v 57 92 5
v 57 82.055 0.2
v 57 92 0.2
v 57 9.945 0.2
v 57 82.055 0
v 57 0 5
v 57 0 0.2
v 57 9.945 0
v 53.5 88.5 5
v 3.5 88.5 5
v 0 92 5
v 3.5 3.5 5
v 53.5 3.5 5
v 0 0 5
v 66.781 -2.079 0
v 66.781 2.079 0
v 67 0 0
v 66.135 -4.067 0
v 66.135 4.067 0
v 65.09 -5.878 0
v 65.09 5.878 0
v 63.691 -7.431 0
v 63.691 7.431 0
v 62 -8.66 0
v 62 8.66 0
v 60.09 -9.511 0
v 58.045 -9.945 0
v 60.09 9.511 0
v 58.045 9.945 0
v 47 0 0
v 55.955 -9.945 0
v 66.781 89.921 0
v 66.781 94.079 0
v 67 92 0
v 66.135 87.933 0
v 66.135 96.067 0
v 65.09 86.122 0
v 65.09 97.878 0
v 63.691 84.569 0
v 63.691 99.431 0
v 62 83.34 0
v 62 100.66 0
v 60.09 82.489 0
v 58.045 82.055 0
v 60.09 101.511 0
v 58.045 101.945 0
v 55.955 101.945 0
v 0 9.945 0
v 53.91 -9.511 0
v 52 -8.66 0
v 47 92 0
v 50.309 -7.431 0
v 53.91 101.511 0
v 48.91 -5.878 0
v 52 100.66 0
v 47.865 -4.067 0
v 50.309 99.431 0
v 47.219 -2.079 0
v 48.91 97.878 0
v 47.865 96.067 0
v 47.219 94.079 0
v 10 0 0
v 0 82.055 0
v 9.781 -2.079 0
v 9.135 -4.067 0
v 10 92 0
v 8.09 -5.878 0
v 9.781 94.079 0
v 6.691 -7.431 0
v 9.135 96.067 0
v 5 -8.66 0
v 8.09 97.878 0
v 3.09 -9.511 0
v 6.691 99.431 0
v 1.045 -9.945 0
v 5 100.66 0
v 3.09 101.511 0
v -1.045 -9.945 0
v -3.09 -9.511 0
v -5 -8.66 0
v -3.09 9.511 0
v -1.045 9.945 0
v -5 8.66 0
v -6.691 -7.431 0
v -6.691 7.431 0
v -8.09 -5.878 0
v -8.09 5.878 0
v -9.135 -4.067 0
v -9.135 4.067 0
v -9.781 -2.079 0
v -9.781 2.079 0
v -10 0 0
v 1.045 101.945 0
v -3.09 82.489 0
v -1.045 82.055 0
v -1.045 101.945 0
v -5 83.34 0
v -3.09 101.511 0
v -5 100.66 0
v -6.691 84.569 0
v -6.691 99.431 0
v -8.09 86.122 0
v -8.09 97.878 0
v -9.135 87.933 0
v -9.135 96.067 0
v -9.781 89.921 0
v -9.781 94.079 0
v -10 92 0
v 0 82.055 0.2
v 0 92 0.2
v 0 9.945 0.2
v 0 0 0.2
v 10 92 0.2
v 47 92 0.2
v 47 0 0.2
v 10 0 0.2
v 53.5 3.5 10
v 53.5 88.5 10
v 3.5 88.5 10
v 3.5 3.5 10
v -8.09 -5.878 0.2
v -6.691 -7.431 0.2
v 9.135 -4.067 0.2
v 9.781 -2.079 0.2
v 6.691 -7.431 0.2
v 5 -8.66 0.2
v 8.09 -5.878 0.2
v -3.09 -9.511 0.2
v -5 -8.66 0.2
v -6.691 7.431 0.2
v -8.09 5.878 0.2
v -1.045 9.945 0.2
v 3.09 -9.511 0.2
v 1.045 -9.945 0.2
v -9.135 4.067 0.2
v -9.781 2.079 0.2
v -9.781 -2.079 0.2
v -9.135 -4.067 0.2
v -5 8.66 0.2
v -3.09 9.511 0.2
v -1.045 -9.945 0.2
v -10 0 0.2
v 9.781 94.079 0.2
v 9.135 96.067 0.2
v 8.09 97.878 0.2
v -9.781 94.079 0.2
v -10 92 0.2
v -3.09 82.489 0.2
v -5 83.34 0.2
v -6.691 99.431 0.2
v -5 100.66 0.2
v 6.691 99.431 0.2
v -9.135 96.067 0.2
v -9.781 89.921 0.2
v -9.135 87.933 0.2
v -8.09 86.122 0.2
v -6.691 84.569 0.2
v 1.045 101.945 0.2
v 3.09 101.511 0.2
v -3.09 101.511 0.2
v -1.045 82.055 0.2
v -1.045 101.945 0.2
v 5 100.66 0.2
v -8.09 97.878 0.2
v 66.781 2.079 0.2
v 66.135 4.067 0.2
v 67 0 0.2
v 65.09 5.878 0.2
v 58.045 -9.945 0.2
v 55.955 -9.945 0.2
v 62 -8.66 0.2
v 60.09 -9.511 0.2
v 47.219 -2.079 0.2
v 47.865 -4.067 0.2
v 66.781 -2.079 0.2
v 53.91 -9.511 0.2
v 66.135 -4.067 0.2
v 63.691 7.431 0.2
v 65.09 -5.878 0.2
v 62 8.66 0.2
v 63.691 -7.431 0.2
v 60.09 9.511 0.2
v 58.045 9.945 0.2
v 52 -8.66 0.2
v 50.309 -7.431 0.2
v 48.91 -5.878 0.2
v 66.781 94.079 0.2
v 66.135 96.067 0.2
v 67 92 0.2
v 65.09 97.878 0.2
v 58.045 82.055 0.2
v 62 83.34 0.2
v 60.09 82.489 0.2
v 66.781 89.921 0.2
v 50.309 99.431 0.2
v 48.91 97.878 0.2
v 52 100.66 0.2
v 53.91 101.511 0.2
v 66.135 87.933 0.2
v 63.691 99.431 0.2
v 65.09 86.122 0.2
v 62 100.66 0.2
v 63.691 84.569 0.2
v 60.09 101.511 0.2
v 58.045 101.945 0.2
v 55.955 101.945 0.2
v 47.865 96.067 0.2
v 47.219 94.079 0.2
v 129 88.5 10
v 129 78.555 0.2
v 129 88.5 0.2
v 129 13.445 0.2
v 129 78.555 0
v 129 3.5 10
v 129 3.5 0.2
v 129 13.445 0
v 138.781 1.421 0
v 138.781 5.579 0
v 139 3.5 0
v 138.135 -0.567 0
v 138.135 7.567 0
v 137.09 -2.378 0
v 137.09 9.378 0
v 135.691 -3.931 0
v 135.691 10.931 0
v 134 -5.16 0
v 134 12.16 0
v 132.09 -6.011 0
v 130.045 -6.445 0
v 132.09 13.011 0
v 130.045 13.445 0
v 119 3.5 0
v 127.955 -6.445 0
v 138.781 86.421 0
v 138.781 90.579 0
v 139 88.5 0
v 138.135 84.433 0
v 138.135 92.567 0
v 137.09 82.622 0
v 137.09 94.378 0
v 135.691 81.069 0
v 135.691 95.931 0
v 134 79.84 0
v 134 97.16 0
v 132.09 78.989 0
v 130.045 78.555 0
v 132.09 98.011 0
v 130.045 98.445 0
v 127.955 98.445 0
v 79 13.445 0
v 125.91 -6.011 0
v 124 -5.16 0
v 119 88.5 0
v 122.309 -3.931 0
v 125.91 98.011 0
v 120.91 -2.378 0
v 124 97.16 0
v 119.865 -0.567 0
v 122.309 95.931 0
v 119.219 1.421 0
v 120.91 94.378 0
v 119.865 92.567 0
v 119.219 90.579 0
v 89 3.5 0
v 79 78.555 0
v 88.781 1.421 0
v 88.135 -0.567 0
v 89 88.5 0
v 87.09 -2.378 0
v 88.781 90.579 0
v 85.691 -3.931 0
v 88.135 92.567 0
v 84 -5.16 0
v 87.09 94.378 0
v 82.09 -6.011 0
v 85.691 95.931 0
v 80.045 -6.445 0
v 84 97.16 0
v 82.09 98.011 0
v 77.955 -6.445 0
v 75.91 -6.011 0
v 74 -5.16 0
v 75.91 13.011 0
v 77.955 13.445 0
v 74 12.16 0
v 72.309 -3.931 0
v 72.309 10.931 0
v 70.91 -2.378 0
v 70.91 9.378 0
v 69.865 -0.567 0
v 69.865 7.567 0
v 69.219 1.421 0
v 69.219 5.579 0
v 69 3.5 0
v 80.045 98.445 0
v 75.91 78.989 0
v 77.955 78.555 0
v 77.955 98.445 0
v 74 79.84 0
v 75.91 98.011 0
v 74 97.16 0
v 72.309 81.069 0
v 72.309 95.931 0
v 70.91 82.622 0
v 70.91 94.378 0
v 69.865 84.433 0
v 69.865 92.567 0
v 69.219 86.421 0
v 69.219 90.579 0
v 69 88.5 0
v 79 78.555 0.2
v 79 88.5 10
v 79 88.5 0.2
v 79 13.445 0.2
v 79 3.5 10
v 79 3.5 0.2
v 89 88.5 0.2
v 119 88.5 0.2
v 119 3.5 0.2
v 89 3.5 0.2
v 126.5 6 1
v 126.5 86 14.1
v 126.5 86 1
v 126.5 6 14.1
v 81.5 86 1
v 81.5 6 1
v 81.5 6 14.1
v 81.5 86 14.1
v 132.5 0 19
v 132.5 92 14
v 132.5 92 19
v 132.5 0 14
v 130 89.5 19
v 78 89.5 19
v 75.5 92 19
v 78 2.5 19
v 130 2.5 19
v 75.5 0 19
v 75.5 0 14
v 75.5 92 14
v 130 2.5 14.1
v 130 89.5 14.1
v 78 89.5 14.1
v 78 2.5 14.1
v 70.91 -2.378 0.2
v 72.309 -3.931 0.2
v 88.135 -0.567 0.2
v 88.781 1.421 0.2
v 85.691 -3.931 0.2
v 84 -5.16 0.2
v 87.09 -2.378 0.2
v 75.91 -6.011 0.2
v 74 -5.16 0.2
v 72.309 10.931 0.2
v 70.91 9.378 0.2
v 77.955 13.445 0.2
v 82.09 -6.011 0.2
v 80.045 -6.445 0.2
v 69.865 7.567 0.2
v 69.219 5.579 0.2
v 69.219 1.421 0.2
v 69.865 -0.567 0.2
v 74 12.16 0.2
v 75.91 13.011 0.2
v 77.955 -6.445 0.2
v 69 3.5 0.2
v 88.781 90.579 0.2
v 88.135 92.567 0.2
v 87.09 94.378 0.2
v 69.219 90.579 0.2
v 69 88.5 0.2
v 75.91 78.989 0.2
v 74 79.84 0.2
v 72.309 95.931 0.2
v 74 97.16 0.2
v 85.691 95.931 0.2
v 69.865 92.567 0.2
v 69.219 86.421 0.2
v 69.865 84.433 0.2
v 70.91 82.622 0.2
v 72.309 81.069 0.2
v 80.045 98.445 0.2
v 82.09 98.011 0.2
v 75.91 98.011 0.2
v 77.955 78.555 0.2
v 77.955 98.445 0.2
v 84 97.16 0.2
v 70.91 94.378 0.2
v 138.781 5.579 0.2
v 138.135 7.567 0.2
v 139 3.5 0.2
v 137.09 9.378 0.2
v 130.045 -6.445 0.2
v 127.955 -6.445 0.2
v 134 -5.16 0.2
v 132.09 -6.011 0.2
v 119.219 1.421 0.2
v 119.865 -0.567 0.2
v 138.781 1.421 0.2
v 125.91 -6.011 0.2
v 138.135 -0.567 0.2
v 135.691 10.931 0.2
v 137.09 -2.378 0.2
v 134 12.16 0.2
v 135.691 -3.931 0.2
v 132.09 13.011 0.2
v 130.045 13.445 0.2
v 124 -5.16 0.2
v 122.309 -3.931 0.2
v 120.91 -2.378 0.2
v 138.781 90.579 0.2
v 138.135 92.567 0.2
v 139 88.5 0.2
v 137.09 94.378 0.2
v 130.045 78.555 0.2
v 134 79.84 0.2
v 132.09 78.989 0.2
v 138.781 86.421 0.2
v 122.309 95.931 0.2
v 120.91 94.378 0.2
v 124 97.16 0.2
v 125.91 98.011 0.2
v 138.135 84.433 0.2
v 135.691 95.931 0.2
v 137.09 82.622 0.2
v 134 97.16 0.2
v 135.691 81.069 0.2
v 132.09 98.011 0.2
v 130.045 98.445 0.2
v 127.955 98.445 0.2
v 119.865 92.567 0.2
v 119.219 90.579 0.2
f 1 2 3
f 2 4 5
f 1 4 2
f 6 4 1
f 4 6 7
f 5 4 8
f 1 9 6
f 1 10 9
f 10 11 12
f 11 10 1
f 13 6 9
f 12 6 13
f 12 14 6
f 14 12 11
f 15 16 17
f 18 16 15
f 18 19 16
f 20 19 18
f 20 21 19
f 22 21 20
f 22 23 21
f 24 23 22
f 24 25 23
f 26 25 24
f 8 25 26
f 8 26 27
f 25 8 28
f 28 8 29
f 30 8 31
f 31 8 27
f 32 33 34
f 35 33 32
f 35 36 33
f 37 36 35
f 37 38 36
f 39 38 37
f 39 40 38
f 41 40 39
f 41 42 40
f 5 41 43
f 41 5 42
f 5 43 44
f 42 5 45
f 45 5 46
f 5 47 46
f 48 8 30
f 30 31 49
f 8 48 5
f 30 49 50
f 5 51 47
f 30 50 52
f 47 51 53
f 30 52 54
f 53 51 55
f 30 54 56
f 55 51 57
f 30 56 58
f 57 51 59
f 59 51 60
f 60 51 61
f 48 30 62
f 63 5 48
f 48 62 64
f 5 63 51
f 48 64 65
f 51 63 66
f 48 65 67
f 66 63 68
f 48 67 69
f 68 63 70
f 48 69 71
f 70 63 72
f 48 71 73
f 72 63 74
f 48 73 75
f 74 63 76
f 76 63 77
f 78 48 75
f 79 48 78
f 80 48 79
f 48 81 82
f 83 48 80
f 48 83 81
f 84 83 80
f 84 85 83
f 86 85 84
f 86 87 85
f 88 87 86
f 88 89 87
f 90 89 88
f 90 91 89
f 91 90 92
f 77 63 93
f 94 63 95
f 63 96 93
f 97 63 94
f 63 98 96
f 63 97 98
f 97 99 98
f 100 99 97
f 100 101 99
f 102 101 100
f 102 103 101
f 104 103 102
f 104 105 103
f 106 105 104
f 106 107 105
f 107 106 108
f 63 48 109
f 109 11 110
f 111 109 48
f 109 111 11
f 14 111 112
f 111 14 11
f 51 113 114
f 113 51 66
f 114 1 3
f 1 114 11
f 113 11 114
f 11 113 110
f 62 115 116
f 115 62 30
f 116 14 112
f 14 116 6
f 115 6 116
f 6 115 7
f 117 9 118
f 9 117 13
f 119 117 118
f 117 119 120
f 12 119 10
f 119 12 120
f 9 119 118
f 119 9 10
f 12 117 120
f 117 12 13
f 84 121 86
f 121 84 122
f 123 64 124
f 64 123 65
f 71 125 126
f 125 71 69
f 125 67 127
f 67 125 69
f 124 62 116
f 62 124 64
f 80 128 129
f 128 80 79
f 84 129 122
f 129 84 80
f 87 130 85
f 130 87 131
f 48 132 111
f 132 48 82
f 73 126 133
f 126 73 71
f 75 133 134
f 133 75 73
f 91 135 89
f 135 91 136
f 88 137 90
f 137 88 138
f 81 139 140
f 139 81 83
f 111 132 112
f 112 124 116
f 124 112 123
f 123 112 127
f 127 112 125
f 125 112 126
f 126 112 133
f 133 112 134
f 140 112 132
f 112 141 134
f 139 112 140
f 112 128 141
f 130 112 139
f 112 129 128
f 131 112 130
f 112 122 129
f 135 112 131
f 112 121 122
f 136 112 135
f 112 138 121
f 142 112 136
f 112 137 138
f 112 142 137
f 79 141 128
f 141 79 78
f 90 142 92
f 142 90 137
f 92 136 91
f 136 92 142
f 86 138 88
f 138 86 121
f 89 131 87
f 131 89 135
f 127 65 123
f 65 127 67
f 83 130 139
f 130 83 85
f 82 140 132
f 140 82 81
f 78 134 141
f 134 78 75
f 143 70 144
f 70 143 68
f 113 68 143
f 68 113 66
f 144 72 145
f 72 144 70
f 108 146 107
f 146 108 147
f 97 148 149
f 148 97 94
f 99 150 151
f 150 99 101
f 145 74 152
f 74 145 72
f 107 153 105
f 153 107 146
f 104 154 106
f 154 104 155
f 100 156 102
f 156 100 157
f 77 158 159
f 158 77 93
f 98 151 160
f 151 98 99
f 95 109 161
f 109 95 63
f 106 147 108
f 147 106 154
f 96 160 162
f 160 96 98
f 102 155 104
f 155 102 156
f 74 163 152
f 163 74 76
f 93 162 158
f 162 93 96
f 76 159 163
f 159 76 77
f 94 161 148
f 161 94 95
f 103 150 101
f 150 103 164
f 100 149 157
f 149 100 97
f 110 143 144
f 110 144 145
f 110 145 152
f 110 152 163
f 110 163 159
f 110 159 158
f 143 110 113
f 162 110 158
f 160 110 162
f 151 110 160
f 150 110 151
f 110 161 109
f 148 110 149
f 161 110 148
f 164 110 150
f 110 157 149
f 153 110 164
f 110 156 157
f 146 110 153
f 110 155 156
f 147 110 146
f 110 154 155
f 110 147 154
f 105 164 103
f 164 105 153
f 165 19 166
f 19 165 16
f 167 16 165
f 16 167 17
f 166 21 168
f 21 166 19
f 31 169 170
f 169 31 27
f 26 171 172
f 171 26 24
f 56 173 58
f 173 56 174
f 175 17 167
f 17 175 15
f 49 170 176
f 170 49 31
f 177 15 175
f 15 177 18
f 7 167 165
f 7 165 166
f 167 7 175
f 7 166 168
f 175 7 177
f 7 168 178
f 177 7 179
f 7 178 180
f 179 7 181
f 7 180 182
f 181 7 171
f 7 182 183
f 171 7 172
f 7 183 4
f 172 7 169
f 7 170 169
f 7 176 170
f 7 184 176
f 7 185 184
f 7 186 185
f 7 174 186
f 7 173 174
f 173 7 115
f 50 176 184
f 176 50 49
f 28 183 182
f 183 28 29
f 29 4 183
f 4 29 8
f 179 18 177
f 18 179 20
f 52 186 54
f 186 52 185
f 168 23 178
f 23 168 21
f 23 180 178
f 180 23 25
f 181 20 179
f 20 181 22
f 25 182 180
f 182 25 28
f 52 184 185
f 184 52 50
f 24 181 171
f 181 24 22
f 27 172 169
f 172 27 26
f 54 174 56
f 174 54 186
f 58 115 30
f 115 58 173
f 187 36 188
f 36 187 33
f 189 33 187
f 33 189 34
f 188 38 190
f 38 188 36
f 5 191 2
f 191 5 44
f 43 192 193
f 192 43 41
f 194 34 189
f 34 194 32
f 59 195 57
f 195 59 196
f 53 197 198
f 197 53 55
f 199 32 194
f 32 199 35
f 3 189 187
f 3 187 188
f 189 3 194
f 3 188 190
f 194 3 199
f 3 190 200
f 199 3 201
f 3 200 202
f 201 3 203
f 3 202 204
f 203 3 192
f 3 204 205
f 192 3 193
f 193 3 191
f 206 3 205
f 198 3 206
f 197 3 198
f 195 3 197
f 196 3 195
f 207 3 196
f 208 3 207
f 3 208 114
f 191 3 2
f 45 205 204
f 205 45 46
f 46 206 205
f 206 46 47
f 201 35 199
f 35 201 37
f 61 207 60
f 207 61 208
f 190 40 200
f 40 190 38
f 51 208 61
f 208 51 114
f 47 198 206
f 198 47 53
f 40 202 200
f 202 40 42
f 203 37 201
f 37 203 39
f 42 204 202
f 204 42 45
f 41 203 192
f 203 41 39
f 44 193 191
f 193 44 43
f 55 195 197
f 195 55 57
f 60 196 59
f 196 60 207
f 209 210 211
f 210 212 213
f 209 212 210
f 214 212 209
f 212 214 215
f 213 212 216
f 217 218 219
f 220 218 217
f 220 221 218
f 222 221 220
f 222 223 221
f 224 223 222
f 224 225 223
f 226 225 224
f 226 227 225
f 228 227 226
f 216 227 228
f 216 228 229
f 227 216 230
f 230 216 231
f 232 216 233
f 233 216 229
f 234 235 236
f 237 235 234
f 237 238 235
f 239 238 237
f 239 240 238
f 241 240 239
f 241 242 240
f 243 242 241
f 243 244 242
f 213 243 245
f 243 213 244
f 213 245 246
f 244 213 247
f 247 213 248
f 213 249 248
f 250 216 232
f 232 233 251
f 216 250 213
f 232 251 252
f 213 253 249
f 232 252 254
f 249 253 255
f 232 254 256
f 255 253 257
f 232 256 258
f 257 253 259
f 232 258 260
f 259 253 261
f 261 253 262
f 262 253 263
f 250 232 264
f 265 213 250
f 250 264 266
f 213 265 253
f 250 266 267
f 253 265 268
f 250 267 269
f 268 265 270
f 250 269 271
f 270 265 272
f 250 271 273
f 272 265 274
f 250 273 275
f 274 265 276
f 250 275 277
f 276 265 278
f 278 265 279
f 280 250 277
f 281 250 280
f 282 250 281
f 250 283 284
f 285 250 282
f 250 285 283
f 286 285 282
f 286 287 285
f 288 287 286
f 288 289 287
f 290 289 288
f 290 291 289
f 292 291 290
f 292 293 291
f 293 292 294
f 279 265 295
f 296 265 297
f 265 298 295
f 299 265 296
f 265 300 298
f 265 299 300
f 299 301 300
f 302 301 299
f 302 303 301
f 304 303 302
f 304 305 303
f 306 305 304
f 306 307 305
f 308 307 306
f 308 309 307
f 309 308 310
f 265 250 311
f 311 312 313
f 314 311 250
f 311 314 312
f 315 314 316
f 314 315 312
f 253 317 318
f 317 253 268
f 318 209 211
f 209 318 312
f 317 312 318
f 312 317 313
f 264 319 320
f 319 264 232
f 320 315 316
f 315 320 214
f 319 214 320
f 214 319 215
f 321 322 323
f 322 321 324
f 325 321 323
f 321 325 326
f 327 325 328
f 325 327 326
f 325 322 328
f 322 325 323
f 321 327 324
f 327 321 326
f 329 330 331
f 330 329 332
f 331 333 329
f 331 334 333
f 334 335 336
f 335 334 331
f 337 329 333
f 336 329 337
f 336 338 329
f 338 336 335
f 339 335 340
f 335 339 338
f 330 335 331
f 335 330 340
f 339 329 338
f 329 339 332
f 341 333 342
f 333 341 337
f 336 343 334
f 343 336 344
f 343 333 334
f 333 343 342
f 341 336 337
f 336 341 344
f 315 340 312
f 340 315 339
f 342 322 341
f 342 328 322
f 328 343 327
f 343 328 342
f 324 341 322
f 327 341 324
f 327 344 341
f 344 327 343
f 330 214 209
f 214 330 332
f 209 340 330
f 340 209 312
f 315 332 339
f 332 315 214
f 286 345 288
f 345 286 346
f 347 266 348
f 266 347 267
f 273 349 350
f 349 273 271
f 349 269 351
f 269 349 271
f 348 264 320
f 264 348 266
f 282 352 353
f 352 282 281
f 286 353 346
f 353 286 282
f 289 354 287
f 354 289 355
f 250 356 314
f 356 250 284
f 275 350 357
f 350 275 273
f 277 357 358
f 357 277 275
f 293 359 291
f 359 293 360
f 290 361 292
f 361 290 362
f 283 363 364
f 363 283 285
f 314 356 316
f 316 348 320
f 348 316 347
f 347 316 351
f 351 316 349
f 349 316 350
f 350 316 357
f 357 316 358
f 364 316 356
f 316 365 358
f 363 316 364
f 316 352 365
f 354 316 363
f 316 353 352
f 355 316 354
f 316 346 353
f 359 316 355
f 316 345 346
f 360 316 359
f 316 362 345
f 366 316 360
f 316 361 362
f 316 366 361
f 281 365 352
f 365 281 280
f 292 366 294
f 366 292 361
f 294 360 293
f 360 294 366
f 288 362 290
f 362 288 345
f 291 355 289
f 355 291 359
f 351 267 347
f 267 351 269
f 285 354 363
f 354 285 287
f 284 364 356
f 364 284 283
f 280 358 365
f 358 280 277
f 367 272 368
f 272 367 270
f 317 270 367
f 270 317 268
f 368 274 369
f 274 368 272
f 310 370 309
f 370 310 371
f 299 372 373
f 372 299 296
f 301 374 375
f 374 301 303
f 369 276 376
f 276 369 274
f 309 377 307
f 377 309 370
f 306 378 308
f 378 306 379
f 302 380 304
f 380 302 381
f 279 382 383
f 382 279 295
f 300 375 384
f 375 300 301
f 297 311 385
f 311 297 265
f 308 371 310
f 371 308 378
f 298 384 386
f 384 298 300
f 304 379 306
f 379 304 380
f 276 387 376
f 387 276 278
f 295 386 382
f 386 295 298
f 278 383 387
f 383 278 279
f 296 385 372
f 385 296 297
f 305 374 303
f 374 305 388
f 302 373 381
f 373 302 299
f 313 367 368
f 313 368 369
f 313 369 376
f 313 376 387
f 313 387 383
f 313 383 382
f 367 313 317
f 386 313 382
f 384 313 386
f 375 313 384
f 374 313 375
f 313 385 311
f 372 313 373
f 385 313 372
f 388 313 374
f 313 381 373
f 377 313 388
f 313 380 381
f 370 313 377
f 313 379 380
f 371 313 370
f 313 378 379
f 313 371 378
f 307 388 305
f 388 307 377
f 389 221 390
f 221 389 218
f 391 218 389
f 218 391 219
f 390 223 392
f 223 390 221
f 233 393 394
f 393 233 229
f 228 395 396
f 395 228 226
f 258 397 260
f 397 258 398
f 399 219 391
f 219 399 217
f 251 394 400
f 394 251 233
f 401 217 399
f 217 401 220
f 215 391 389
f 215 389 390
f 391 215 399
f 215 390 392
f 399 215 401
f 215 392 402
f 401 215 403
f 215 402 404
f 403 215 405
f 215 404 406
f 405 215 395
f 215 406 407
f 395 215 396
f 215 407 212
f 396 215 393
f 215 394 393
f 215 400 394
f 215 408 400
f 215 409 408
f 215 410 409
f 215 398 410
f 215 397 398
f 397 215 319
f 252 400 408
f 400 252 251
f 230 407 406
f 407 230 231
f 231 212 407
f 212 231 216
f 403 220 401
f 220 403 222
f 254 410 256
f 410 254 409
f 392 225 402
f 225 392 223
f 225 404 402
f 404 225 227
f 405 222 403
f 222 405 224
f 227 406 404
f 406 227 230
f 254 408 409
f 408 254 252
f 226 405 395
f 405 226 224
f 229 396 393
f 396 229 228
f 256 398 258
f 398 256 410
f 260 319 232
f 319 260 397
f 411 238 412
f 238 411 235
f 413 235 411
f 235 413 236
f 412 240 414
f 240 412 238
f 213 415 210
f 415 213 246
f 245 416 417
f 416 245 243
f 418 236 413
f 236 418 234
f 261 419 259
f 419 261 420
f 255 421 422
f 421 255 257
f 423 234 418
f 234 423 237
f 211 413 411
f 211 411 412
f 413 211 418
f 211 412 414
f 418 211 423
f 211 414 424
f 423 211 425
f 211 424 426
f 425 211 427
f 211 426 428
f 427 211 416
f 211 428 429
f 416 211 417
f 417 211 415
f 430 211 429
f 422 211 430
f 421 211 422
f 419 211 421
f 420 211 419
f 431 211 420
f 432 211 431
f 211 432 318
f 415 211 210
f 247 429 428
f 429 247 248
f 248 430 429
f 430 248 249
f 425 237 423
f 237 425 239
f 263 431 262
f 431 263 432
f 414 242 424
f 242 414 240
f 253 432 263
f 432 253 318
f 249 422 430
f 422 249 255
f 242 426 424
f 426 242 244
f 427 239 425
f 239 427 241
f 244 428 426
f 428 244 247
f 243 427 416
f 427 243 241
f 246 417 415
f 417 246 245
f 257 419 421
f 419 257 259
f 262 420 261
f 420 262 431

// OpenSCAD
// Display the Cover
display_cover = "yes"; // [yes,no]
// Display the box
display_box = "yes"; // [yes,no]
// Create ears at the corner
with_antiwarp_ears = "yes"; // [yes,no]


// the x length inside the box (the resulting x of the box is inner_x + 2*wall)
inner_x = 45;
// the y length inside the box
inner_y = 80;
// the z height inside the box, until the stacking frame begins
inner_z = 13;

// the z height of the stacking frame
stack_z = 5;
// per side gap between the box-bottom and the stacking frame (box bttom = inner_x + 2*wall; inner stackingframe x = inner_x + 2*wall + 2*stack_gap)
stack_gap = 1;

// wall thickness
wall = 2.5;
// bottom thickness
bottom = 1;

// start-height for overhang suport (should be >stack_z )
support_start_height = 10;

// height of the cover (the stacking part has the "stack_z"-height)
cover_height = 5;

// radius of the antiwarp ear
ear_radius = 10;
// height of the antiwarp ear, should be your layer-height for easy cutoff
ear_height = 0.2;


if(display_cover == "yes"){
	stackable_box_cover(inner_x,inner_y,stack_z,stack_gap,wall,cover_height);
	if(with_antiwarp_ears == "yes"){
		ears(0, 0, inner_x + wall*4 + stack_gap*2, inner_y + wall*4 + stack_gap*2);
	}
}


if(display_box == "yes"){
translate([inner_x + wall*4 + stack_gap*2 + ear_radius*2 + 2,wall + stack_gap,0]){
	stackable_box(inner_x,inner_y,inner_z,stack_z,stack_gap,wall,bottom,support_start_height);
	if(with_antiwarp_ears == "yes"){
		difference() {
			ears(0, 0, inner_x + wall*2, inner_y + wall*2);
			translate([wall,wall, 0]) 
				cube([inner_x, inner_y, inner_z*2]);
		}
	}
}
}


module stackable_box_cover(x, y,stack_z, gap, w,c) {
	cube([x + w*4 + gap*2, y + w*4 + gap*2, c]);
	translate([w+gap, w+gap, 0])
		cube([x + w*2, y + w*2, stack_z+c]);


}


module stackable_box(x, y, z,stack_z, gap, w, b, supheight) {
	box(x, y, z, w, b);
	translate([-wall-gap, -wall-gap, z+b])
		box(x + wall*2 + gap*2, y + wall*2 + gap*2, stack_z, w, 0);

	difference() {
		hull() {
			translate([-wall-gap, -wall-gap, z+b]) 
				box(x + wall*2 + gap*2, y + wall*2 + gap*2, 0.1, w, 0);
			translate([0, 0, supheight]) 
				box(x, y, 0.1, w, b);
		}
		translate([w,w, 0]) 
			cube([x, y, z*2]);
	}


}

module box(x, y, z, w,b) {
	difference() {
		cube([(x + (2 * w)), (y + (2 * w)), (z + b)]);
		translate([w, w, b]) 
			cube([x, y, (z * 2)]);
	}
}

module ears(xmin, ymin, xmax, ymax) {
	translate([xmin, ymin, 0]) cylinder(r = ear_radius, h = ear_height);
	translate([xmin, ymax, 0]) cylinder(r = ear_radius, h = ear_height);
	translate([xmax, ymin, 0]) cylinder(r = ear_radius, h = ear_height);
	translate([xmax, ymax, 0]) cylinder(r = ear_radius, h = ear_height);
}
